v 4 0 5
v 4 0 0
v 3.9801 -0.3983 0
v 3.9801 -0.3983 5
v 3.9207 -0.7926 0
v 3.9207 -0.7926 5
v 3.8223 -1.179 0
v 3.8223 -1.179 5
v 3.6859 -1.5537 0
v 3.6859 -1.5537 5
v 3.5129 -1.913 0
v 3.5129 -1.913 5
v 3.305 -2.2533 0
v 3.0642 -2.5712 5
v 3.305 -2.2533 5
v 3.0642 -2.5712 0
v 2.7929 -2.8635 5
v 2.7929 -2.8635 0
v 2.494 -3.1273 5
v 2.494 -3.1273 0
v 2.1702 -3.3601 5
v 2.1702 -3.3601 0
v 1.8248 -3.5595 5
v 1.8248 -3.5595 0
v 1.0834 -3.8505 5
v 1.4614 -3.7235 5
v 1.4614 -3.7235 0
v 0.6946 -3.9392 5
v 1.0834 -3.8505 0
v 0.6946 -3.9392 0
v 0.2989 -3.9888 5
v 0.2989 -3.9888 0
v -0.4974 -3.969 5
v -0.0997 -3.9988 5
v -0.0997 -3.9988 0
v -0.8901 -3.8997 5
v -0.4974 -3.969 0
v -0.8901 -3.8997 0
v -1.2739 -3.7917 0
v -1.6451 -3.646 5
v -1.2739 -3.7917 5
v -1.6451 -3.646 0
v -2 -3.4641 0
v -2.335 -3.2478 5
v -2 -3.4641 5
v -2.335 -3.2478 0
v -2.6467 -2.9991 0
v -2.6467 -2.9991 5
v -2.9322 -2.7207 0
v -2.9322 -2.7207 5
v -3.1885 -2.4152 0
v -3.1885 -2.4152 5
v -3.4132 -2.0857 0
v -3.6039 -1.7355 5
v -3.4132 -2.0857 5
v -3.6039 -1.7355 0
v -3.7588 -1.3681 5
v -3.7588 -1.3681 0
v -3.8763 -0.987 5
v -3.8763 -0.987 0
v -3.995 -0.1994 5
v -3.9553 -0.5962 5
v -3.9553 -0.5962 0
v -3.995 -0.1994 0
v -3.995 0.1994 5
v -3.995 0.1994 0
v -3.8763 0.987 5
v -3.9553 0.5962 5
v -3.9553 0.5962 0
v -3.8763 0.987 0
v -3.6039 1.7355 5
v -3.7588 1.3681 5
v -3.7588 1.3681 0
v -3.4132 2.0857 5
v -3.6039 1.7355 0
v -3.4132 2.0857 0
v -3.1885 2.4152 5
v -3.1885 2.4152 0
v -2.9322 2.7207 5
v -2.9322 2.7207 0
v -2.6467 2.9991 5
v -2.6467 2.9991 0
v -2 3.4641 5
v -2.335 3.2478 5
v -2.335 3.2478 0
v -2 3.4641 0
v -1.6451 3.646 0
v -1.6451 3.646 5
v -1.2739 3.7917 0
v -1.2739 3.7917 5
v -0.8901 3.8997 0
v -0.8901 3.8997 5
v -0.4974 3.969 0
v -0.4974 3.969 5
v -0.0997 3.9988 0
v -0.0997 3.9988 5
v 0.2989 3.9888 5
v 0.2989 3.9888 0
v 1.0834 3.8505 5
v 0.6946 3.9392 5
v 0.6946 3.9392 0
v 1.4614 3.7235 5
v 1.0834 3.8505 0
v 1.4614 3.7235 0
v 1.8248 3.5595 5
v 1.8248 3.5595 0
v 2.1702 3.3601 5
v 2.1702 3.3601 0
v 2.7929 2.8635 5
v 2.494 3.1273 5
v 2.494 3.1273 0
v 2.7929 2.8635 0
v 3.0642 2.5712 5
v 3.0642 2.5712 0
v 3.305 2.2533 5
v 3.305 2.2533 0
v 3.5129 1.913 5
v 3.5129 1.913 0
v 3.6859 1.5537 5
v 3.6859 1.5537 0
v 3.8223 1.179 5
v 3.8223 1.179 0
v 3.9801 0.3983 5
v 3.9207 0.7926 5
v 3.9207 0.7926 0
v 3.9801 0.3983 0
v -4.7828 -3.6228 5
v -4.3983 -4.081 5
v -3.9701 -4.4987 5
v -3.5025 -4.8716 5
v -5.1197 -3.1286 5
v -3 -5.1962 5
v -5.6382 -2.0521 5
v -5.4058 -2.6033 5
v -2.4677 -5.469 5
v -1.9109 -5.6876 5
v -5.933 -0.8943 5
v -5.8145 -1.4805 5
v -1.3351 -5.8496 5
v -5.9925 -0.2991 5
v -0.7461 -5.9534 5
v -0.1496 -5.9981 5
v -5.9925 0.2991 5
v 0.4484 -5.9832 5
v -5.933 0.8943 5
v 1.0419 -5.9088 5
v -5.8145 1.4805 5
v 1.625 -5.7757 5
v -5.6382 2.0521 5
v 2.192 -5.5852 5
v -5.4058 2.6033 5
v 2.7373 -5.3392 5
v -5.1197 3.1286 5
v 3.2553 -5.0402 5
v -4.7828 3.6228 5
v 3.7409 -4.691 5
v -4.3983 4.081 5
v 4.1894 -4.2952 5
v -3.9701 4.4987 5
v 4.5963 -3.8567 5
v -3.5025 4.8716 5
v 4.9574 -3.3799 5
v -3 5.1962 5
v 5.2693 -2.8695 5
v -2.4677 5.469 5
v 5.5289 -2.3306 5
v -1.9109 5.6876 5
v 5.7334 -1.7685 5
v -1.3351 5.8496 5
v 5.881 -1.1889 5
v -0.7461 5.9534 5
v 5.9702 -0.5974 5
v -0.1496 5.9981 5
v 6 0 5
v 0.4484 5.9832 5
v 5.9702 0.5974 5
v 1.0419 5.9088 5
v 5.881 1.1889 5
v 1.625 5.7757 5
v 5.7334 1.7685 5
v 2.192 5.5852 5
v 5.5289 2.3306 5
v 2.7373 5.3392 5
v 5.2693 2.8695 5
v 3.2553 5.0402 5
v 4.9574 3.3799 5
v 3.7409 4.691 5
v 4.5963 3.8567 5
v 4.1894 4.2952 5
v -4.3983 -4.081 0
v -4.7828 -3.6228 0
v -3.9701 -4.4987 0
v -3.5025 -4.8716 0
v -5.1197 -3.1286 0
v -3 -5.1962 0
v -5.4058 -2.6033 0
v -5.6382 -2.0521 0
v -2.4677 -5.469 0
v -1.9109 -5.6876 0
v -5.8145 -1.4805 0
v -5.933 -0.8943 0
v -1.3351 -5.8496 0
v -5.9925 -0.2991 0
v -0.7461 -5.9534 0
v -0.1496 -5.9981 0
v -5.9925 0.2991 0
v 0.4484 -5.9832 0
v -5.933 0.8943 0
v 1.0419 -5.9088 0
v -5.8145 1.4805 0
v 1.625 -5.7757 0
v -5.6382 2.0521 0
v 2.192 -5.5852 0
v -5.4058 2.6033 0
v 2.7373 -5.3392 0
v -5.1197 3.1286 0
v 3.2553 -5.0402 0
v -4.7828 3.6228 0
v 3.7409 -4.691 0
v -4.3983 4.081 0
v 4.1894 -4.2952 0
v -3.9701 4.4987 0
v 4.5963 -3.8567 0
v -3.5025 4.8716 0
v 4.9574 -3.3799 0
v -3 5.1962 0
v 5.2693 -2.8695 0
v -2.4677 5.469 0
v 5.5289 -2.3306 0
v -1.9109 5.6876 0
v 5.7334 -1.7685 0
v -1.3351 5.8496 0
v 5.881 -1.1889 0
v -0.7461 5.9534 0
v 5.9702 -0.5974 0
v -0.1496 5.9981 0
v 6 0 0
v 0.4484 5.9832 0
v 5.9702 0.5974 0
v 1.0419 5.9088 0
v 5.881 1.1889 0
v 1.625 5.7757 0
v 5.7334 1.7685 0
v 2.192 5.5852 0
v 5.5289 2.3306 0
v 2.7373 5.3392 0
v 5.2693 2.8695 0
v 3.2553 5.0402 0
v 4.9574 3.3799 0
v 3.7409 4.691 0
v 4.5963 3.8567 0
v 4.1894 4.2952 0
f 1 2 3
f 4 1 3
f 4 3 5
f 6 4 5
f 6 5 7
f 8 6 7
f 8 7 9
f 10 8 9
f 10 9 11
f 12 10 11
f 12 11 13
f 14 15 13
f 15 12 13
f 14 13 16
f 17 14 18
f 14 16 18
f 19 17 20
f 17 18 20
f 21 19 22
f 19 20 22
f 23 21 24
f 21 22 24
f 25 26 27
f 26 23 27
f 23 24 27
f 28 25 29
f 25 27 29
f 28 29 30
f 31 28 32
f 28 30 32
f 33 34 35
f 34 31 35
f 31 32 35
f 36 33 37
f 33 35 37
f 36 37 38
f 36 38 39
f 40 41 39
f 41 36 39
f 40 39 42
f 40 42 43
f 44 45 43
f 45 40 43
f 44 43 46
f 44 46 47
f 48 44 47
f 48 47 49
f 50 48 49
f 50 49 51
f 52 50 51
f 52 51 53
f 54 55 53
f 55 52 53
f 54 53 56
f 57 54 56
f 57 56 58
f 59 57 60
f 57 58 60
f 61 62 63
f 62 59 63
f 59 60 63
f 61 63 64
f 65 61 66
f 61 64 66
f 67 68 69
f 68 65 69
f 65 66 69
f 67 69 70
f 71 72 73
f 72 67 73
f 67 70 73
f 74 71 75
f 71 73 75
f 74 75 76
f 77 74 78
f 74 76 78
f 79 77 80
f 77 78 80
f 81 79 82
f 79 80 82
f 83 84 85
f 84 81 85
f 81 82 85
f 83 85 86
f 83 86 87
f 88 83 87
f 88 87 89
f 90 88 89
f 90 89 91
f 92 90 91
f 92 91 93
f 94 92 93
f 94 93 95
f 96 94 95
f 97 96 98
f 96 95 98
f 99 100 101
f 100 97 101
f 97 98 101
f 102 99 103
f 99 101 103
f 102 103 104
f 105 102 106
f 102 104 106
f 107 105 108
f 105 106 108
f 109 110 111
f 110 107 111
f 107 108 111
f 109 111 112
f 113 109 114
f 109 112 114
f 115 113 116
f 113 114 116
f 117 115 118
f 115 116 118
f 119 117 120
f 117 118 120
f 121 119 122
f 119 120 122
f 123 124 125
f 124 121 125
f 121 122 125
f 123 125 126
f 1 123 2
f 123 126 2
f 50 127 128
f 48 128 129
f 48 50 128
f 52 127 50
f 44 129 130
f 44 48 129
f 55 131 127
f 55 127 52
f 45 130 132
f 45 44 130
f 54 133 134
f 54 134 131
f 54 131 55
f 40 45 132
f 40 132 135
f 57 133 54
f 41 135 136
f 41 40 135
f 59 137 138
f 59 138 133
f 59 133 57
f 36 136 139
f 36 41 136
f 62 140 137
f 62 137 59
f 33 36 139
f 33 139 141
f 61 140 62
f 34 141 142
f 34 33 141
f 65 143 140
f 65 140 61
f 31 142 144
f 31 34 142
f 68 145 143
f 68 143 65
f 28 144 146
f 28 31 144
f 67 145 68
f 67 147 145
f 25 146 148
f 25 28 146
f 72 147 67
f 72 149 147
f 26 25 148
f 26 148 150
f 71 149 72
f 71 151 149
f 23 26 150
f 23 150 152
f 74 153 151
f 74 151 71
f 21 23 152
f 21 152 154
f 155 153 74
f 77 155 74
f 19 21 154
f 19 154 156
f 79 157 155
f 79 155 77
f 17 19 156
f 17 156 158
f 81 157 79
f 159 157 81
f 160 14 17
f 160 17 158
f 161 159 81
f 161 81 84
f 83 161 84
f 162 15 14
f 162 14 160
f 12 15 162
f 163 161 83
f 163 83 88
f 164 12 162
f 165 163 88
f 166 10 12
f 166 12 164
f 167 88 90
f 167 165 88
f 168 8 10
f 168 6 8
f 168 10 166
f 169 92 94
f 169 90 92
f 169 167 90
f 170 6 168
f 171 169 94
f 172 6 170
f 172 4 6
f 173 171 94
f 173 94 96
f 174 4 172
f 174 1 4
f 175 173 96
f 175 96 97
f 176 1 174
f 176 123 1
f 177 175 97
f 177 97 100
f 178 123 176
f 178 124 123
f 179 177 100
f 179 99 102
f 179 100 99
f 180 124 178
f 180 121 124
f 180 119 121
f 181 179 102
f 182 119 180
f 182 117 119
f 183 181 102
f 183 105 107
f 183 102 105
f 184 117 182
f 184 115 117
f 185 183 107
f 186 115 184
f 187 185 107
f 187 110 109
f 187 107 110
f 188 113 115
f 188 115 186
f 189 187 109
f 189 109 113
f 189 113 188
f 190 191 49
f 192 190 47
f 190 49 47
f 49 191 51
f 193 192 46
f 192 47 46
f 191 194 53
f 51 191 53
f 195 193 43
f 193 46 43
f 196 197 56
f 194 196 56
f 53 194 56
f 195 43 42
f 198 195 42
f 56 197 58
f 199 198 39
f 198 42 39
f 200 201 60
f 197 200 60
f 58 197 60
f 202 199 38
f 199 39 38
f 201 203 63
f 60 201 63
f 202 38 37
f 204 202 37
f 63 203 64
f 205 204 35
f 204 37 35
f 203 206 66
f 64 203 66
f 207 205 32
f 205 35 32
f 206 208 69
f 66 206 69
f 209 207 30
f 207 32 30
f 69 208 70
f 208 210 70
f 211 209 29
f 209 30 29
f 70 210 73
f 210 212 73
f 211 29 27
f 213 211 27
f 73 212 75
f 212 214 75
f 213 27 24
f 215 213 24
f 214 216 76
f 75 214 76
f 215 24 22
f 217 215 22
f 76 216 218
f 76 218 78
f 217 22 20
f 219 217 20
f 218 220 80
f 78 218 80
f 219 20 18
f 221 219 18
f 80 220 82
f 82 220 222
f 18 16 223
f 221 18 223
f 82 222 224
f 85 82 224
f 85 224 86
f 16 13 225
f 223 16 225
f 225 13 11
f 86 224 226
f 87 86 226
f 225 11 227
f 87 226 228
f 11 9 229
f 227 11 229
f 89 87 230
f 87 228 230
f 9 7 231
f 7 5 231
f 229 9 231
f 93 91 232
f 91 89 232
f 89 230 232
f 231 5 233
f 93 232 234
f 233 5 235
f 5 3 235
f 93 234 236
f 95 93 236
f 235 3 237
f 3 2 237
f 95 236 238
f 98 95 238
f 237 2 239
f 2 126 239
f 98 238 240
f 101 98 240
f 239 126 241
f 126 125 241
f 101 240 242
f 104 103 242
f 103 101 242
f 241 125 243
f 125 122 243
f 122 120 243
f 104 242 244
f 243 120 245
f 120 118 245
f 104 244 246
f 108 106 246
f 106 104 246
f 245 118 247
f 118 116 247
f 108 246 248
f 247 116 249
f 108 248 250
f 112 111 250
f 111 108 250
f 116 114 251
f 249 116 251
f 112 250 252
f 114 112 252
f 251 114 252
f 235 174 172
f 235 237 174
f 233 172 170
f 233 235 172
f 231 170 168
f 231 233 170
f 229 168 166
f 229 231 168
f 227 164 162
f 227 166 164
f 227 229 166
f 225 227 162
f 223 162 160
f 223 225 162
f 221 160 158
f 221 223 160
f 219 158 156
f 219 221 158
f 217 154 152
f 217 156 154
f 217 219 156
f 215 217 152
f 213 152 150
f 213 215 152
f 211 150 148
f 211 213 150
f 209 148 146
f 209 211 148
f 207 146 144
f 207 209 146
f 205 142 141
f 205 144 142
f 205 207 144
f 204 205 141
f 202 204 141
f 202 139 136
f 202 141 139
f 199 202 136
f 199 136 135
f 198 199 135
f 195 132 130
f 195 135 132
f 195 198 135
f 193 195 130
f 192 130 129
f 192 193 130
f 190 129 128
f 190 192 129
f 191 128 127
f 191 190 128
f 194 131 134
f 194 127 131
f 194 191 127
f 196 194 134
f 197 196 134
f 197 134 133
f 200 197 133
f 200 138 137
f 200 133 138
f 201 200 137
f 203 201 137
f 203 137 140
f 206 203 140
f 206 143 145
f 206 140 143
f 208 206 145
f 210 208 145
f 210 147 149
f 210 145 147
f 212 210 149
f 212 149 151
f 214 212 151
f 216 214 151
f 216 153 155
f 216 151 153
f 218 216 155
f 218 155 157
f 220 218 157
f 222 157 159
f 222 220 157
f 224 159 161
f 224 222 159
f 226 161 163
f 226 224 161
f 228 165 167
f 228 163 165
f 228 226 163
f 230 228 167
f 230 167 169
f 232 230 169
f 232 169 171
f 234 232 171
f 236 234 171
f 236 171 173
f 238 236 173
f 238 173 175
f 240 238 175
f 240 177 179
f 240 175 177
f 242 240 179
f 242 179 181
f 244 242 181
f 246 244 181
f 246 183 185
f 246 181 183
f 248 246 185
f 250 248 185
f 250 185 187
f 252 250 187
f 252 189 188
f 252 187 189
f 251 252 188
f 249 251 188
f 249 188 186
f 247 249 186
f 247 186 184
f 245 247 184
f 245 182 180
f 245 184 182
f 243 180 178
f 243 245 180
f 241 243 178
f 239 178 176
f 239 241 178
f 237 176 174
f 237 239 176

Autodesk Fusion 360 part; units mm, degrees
sketch "Sketch1" plane through (0, 0, 0) normal (0, 0, 1) x (1, 0, 0)
  circle A0 centre (0, 0) radius 4
  circle A1 centre (0, 0) radius 6
  dimension "d1" = 8
  dimension "d2" = 12
extrude "Extrude1" add sketch "Sketch1" along normal blind 5 makes body 1
copy_body "Body->Comp1" bodies 1 removing the originals makes body 2 in component "5mm Spacer - 8mm Shaft"
component "5mm Spacer - 8mm Shaft" placed x (1, 0, 0) y (0, 1, 0) z (0, 0, 1) at (0, 0, 0)
